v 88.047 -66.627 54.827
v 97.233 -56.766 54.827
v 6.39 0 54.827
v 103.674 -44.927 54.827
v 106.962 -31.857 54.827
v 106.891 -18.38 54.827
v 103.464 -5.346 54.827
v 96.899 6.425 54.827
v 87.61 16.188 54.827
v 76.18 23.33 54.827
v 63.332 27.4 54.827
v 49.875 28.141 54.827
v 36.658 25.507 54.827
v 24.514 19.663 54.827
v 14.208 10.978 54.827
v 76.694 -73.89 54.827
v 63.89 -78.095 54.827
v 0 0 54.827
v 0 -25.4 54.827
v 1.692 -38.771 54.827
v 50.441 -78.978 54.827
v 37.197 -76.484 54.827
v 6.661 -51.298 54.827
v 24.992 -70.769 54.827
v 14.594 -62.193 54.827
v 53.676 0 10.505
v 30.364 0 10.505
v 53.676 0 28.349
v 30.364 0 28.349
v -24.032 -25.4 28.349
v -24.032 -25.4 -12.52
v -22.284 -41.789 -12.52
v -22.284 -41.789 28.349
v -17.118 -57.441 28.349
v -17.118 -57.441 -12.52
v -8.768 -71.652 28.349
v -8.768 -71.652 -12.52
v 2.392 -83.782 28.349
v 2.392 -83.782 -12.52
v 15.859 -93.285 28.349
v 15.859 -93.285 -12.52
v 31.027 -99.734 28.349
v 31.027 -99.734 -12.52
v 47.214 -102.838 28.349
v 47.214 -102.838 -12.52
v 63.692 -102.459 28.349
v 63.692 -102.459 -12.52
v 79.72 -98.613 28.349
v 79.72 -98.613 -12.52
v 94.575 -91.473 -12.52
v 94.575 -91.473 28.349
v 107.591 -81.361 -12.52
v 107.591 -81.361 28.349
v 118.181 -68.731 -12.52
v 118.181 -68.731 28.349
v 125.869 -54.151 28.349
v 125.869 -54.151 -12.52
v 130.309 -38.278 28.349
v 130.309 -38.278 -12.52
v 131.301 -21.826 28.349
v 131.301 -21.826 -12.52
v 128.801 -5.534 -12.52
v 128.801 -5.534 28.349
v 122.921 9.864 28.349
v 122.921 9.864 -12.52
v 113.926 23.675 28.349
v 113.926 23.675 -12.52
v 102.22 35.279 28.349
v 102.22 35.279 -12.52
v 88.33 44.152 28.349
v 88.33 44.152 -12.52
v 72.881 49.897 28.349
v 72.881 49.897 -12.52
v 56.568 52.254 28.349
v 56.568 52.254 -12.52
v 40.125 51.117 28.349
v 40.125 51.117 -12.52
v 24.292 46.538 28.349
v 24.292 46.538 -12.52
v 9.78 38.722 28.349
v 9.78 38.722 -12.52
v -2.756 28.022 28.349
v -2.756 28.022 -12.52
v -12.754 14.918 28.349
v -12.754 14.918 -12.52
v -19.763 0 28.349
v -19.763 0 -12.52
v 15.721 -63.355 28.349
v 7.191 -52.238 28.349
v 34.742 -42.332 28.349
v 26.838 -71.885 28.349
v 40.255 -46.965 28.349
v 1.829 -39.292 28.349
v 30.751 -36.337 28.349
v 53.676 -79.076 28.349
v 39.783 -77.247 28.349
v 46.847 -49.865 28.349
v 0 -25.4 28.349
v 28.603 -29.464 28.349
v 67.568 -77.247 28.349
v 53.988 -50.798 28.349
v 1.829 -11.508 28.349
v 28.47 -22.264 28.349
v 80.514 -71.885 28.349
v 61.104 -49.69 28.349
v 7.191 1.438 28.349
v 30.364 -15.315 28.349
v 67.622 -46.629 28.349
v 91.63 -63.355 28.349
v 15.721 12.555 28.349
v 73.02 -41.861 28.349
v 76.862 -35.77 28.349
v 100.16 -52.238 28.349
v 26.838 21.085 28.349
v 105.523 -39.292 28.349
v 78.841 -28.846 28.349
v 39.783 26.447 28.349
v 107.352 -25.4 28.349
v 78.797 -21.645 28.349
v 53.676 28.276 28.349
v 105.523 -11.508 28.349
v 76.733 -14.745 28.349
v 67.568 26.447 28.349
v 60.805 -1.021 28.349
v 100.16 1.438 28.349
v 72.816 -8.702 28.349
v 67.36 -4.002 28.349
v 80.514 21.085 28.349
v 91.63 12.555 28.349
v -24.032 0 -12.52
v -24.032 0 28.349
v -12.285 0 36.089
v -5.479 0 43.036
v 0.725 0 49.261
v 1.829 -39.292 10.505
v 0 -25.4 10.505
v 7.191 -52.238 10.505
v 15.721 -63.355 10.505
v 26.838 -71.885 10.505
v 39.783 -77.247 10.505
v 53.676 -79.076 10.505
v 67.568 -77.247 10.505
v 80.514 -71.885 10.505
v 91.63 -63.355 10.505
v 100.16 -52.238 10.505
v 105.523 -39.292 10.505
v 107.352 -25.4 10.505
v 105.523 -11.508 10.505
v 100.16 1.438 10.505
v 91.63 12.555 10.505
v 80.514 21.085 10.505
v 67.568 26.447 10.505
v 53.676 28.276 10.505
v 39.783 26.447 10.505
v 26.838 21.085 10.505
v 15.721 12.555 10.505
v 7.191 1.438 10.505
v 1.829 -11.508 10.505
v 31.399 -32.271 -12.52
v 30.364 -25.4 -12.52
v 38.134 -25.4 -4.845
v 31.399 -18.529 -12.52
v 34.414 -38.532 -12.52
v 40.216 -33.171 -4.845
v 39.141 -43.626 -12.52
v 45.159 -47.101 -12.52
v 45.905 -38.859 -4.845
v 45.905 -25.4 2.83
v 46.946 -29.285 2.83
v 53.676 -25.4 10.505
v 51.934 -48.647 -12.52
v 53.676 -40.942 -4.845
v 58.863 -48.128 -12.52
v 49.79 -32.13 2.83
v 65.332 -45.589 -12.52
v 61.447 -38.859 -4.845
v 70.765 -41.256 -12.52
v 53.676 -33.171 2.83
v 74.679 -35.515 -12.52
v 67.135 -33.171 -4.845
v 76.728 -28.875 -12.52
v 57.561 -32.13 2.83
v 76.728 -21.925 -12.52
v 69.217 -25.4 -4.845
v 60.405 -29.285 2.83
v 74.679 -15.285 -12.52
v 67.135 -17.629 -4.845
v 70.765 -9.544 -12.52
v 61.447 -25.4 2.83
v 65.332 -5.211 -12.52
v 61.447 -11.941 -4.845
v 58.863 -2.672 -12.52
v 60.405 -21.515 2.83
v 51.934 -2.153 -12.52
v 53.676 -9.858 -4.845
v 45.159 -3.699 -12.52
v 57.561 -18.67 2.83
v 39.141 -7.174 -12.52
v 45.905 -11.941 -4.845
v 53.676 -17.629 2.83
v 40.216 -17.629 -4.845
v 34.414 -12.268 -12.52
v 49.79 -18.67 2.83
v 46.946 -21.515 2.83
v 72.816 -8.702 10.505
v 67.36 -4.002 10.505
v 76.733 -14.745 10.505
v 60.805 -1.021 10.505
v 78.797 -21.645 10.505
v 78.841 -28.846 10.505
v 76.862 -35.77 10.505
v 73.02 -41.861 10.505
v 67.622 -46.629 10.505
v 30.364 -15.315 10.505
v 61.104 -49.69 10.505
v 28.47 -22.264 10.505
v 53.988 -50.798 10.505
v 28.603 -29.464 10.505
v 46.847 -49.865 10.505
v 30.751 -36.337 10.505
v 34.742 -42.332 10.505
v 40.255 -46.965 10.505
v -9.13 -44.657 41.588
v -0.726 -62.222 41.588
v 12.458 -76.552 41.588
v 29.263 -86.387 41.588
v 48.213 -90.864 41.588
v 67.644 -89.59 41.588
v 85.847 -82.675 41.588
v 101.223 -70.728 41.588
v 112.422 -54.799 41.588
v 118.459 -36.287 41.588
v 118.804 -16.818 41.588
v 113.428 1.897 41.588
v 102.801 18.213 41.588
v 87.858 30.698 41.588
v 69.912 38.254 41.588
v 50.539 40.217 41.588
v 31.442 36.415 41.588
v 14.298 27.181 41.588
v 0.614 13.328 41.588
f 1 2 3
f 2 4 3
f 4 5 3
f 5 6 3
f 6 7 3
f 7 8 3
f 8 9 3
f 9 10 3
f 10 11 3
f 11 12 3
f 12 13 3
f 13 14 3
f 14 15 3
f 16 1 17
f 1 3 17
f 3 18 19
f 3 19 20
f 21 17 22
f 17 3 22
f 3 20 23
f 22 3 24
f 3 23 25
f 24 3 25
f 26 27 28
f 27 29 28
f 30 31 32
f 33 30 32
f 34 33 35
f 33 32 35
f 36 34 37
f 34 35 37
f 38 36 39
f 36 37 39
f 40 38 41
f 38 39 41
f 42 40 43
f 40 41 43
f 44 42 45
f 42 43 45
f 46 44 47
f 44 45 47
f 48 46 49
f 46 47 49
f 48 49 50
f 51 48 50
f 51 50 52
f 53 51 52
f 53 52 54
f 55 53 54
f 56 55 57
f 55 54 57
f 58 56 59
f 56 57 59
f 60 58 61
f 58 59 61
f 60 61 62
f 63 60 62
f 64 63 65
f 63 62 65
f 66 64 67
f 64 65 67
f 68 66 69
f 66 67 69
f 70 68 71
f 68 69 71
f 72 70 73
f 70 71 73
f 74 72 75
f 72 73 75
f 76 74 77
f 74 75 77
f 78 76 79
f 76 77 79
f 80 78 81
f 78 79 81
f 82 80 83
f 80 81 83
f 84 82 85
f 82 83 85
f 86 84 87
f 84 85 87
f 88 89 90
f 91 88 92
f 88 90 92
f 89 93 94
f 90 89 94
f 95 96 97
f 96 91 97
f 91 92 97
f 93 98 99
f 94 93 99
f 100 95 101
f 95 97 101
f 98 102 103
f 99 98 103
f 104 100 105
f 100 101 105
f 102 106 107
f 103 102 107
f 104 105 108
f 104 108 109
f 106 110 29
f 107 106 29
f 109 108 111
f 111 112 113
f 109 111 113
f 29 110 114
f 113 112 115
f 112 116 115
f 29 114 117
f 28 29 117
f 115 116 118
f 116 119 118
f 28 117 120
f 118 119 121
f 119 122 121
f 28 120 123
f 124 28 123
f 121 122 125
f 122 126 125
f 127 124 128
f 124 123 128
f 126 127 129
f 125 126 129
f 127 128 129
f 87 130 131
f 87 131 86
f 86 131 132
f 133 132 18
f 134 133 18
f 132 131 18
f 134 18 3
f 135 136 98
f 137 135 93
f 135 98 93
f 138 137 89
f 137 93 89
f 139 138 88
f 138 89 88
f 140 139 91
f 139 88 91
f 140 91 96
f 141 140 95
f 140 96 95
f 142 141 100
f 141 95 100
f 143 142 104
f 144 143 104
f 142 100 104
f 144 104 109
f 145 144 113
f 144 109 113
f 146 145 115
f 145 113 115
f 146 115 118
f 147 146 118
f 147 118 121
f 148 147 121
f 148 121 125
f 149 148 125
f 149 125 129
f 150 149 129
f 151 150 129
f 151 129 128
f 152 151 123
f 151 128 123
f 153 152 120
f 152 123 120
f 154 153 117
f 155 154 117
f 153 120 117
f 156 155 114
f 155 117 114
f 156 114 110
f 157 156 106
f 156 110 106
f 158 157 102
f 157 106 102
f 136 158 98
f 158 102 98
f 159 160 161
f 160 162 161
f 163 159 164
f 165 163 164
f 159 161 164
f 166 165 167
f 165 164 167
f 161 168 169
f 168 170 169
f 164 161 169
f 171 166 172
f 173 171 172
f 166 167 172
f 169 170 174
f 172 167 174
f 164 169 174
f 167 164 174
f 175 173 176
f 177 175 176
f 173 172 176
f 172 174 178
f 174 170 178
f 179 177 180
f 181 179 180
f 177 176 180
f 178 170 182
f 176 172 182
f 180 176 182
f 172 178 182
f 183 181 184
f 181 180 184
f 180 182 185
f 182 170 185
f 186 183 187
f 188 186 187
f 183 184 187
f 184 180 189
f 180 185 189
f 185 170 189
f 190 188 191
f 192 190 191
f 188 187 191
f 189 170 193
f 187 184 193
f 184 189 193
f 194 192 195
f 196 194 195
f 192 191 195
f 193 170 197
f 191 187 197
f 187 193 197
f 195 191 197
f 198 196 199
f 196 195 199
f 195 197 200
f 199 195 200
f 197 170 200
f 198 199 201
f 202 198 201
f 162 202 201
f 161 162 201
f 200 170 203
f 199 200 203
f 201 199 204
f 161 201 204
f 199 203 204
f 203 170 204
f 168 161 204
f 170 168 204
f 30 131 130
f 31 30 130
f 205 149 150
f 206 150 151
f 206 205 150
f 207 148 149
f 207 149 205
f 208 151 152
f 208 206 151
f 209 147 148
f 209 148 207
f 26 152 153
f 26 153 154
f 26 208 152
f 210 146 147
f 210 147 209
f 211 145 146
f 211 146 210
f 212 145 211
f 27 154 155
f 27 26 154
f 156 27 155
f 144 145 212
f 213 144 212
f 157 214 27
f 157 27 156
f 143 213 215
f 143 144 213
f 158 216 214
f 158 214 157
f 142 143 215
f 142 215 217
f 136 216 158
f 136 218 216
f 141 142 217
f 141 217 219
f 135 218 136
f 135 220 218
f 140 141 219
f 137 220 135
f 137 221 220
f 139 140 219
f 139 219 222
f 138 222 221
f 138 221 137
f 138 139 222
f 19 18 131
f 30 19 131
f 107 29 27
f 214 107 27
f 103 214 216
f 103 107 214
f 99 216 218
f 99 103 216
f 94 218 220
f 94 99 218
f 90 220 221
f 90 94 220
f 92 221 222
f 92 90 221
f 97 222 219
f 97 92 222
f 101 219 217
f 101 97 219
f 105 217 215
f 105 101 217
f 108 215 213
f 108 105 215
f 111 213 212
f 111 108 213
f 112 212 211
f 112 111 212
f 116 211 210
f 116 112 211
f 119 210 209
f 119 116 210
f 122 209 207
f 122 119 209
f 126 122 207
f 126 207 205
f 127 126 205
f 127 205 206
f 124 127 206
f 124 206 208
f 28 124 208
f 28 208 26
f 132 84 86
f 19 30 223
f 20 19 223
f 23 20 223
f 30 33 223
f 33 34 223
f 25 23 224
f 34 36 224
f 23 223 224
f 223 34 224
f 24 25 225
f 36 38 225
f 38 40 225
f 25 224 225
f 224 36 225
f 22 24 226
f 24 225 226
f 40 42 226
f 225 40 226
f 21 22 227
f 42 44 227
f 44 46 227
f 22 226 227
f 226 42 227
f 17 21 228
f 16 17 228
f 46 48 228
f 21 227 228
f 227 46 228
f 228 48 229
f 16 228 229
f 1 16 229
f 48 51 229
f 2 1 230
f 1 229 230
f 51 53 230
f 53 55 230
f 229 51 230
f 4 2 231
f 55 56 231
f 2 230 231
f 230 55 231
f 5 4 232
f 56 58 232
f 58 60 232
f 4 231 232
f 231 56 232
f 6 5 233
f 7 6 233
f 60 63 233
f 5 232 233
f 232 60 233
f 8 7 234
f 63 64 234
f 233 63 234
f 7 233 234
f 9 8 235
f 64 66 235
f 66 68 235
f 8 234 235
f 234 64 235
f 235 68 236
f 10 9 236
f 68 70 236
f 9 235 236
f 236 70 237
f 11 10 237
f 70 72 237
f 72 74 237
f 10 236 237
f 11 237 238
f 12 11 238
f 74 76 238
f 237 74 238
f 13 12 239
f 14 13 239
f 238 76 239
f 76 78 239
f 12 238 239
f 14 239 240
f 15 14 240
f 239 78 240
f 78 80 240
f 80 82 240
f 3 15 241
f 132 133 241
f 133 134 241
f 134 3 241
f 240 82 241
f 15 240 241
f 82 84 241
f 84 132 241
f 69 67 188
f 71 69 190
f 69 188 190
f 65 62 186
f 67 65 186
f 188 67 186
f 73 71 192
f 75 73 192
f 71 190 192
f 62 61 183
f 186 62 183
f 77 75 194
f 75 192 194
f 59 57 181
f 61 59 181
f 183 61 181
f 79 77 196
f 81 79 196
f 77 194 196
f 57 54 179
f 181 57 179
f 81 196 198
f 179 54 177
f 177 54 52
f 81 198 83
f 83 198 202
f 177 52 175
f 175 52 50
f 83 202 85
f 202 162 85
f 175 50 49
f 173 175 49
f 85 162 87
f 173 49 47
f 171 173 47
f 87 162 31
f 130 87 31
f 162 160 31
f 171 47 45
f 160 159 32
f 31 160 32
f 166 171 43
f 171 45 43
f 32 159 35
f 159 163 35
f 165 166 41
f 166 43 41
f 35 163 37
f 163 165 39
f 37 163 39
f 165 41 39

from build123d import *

# Parameters (mm, degrees)
F1_DEPTH   = 25.4
F1_FACE_W  = 25.4
F1_FACE_H  = 44.3220827729
F1_FACE1_W = 30.3635057062
F1_FACE1_H = 17.8439561278


with BuildPart() as f1:
    # F0 (on Front) → F1 (new body)
    with BuildSketch(Plane.XZ):
        Polygon((0, 54.8269934952), (-24.0317806602, 28.3488668501), (0, 28.3488668501), align=None)
        Polygon((0, 28.3488668501), (-24.0317806602, 28.3488668501), (-24.0317806602, -12.5195495784), (0, 10.5049107224), align=None)
        Polygon((0, 54.8269934952), (0, 28.3488668501), (30.3635057062, 28.3488668501), (53.6757707596, 54.8269934952), align=None)
        Polygon((0, 10.5049107224), (-24.0317806602, -12.5195495784), (30.3635057062, -12.5195495784), (30.3635057062, 10.5049107224), align=None)
        Polygon((53.6757707596, 54.8269934952), (30.3635057062, 28.3488668501), (30.3635057062, 10.5049107224), (53.6757707596, 10.5049107224), align=None)
        Polygon((30.3635057062, 10.5049107224), (30.3635057062, -12.5195495784), (53.6757707596, 10.5049107224), align=None)
    extrude(amount=F1_DEPTH)

    # F1_face (on face) + F1_face1 (on face) → F2 (revolve)
    with BuildSketch(Plane(origin=(53.6757707596, -12.7, 32.6659521088), x_dir=(0, 1, 0), z_dir=(1, 0, 0))):
        Rectangle(F1_FACE_W, F1_FACE_H)
    with BuildSketch(Plane(origin=(15.1328731022, -25.4, 21.1555782678), x_dir=(1, 0, 0), z_dir=(0, -1, 0))):
        Polygon((-39.1646537623, -33.6751278462), (15.230632604, -33.6751278462), (38.5428976574, -10.6506675454), (38.5428976574, 33.6714152274), (-15.1328731022, 33.6714152274), (-39.1646537623, 7.1932885823), align=None)
        with Locations((0.0488797509, -1.7286894816)):
            Rectangle(F1_FACE1_W, F1_FACE1_H, mode=Mode.SUBTRACT)
    revolve(axis=Axis((53.6757707596, -25.4, 32.6659521088), (0, 0, 1)))


solid = f1.part
